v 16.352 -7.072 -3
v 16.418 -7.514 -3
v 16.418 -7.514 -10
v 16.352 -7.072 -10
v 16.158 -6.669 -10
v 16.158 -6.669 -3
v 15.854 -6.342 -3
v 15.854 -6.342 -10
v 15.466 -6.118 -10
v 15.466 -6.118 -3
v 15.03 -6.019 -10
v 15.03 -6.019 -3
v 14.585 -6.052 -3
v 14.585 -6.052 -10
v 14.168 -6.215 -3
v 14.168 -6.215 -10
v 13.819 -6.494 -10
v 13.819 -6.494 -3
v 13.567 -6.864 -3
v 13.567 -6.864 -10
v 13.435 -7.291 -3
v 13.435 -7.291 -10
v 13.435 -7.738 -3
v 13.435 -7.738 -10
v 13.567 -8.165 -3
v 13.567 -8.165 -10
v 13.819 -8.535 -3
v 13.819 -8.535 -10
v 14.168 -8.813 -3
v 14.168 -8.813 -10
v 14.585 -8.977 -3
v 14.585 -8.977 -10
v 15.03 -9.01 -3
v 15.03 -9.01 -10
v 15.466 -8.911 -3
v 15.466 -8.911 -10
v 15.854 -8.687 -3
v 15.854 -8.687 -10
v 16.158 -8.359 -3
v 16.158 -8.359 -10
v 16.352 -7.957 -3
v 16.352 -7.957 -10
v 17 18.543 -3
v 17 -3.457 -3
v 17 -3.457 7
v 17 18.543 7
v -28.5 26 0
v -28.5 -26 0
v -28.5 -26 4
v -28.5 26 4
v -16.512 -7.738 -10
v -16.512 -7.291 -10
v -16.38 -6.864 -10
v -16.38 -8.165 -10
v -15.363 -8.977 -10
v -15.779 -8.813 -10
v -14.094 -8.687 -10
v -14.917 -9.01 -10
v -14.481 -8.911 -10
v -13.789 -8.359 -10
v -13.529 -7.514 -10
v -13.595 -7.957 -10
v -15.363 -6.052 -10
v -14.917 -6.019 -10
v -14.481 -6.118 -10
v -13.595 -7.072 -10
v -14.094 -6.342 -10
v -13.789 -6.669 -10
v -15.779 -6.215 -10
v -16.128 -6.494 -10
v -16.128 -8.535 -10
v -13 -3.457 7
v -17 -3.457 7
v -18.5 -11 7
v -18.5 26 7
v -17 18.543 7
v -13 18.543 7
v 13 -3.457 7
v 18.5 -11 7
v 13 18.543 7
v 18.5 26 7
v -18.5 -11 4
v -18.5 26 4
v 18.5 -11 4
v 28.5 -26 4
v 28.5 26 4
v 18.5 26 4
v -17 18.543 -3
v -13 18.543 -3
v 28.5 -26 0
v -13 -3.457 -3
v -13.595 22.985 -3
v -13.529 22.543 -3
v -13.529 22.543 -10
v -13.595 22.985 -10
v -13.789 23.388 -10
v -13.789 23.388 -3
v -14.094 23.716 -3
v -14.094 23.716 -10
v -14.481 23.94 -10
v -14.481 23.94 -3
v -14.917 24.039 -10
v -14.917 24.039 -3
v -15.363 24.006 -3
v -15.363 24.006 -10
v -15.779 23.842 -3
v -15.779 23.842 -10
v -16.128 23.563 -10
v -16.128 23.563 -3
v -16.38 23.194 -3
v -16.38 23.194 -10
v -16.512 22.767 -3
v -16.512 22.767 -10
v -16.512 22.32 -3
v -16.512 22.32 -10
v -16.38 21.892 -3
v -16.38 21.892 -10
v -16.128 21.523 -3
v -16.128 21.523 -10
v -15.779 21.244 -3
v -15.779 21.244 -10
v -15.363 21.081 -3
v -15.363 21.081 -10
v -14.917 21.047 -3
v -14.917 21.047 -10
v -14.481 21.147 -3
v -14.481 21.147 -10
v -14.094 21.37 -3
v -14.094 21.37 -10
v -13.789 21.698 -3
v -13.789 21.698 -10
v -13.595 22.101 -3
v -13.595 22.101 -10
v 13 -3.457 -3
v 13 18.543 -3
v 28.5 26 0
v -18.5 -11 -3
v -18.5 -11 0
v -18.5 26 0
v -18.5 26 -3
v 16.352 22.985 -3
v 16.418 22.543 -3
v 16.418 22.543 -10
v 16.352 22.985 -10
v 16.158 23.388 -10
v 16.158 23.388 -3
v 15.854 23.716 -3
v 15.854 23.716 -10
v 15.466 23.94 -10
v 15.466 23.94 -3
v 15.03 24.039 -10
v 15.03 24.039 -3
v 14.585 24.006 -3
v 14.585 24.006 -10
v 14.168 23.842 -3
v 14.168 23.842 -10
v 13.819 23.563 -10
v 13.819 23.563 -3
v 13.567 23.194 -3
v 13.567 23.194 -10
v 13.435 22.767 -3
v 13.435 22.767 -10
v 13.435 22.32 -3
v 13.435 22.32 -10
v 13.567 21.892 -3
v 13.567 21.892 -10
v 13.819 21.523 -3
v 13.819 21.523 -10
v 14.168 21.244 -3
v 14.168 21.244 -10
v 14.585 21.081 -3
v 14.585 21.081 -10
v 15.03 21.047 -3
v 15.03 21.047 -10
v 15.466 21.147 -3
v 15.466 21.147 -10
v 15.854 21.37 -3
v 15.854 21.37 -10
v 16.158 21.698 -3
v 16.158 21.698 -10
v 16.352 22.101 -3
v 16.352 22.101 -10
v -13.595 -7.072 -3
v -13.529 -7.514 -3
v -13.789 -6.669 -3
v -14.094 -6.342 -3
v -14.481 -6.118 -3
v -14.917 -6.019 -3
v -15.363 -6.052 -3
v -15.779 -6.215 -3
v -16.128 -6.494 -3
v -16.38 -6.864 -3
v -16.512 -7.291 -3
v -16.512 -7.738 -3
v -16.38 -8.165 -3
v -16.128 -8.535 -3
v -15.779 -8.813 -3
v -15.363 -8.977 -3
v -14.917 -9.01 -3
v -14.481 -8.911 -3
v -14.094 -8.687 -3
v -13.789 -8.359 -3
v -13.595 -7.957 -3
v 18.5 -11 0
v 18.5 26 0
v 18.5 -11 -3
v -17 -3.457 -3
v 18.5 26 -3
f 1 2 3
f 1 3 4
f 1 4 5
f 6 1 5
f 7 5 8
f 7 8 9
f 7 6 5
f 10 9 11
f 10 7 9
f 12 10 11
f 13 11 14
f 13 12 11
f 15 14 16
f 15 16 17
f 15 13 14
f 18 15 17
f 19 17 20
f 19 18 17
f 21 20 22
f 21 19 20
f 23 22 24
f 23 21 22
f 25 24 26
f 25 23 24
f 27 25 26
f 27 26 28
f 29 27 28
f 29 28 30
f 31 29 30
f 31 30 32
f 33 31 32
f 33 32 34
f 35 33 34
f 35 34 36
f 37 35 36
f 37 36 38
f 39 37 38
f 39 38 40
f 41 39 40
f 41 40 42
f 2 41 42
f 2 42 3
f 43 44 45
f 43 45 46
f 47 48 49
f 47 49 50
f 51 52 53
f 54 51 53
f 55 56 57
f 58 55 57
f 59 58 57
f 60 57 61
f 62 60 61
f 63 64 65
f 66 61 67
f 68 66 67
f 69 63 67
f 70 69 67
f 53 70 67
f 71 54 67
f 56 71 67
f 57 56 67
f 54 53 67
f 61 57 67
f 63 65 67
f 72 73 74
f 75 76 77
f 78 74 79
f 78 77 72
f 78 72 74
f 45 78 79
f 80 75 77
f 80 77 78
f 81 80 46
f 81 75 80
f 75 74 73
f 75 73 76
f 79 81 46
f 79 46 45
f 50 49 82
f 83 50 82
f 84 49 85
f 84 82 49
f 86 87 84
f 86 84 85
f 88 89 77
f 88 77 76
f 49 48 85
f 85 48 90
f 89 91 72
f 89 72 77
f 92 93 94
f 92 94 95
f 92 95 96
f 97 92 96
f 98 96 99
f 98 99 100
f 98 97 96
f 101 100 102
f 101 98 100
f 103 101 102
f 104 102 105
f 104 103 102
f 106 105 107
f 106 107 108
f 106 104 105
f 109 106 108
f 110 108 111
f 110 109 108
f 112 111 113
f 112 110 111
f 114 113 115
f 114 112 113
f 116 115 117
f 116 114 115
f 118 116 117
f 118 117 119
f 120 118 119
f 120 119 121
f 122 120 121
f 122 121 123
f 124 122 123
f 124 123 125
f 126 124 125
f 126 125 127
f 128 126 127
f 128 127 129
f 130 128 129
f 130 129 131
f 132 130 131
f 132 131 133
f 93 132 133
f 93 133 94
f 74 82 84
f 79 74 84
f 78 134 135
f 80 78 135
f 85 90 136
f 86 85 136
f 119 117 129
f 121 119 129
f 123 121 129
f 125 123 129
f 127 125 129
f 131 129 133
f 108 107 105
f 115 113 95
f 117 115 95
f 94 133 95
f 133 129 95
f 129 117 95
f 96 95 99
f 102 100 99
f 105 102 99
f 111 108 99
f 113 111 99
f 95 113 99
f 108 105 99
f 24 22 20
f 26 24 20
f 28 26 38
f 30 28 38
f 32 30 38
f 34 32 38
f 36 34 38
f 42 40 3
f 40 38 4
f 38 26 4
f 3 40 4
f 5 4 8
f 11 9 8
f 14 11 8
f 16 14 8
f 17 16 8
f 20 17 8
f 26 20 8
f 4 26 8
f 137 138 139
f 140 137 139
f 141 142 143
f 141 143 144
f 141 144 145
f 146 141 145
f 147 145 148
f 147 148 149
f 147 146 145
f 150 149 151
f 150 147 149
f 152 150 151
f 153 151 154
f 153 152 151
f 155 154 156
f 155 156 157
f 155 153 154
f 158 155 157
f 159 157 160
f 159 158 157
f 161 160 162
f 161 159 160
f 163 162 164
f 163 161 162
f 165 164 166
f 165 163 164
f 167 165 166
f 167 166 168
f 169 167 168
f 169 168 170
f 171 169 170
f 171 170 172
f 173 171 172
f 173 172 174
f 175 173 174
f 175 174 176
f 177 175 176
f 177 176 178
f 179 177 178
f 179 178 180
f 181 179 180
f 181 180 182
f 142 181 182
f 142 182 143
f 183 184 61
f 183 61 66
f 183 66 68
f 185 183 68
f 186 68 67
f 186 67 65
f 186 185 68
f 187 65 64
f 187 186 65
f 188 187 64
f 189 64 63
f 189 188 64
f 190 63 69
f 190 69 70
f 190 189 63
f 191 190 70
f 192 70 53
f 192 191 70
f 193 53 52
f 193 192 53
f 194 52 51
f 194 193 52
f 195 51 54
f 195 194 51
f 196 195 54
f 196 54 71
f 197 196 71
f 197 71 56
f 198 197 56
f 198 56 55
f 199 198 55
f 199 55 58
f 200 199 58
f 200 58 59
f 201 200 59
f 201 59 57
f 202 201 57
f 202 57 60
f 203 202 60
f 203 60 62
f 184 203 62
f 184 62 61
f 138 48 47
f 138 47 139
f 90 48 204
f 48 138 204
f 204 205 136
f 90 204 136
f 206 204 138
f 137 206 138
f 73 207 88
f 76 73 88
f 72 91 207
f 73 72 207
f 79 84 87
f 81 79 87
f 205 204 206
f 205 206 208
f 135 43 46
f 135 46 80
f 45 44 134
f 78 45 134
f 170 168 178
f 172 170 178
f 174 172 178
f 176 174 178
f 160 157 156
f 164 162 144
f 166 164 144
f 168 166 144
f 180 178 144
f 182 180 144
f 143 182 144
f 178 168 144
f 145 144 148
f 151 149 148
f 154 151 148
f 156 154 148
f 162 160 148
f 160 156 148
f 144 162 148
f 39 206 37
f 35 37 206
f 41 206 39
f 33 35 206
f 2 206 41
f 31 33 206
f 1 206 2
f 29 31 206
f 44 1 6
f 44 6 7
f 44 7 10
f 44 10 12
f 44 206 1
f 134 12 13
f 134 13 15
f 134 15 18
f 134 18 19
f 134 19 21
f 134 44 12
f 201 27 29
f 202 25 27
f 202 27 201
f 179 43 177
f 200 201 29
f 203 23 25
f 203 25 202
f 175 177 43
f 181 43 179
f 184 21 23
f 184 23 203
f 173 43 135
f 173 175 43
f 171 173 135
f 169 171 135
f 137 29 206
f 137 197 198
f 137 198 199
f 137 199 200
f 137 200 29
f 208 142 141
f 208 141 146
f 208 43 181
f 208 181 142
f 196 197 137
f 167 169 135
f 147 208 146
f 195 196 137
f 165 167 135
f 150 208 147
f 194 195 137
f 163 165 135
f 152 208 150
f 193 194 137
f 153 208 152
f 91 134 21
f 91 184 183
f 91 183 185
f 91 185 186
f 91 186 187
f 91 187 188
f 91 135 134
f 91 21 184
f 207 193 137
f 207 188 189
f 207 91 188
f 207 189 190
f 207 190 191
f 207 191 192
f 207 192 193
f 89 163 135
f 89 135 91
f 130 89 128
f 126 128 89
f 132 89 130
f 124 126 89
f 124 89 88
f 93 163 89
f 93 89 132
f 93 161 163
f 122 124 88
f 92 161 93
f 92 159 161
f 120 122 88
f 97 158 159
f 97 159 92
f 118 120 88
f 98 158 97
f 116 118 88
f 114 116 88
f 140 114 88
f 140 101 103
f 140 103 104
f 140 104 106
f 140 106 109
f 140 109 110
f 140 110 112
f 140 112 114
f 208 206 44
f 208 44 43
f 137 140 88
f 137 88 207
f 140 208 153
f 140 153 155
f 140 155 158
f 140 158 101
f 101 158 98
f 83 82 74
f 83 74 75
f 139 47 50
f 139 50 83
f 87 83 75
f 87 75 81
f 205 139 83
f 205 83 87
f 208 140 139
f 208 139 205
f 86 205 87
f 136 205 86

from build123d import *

# Parameters (mm, degrees)
SKETCH1_W           = 57
SKETCH1_H           = 52
BOSS_EXTRUDE1_DEPTH = 4
SKETCH3_W           = 37
SKETCH3_H           = 37
BOSS_EXTRUDE2_DEPTH = 3
SKETCH4_W           = 37
SKETCH4_H           = 37
BOSS_EXTRUDE3_DEPTH = 3
SKETCH6_R           = 1.5
BOSS_EXTRUDE4_DEPTH = 10
SKETCH6_6_R         = 1.5
BOSS_EXTRUDE6_DEPTH = 10
SKETCH8_W           = 4
SKETCH8_H           = 22
CUT_EXTRUDE1_DEPTH  = 11


with BuildPart() as part:
    # Sketch1 → Boss-Extrude1 (new body)
    with BuildSketch(Plane.XY):
        Rectangle(SKETCH1_W, SKETCH1_H)
    extrude(amount=BOSS_EXTRUDE1_DEPTH)

    # Sketch3 → Boss-Extrude2 (add)
    with BuildSketch(Plane.XY.offset(4)):
        with Locations((0, 7.5)):
            Rectangle(SKETCH3_W, SKETCH3_H)
    extrude(amount=BOSS_EXTRUDE2_DEPTH)

    # Sketch4 → Boss-Extrude3 (add)
    with BuildSketch(Plane(origin=(0, 0, 0), x_dir=(-1, 0, 0), z_dir=(0, 0, -1))):
        with Locations((0, 7.5)):
            Rectangle(SKETCH4_W, SKETCH4_H)
    extrude(amount=BOSS_EXTRUDE3_DEPTH)

    # Sketch6 → Boss-Extrude4 (add)
    with BuildSketch(Plane.XY):
        with Locations((14.91830134, 22.543210914)):
            Circle(SKETCH6_R)
        with Locations((14.91830134, -7.514403638)):
            Circle(SKETCH6_R)
    extrude(amount=-BOSS_EXTRUDE4_DEPTH)

    # Sketch6<6> → Boss-Extrude6 (add)
    with BuildSketch(Plane.XY):
        with Locations((-15.028807276, 22.543210914)):
            Circle(SKETCH6_6_R)
        with Locations((14.91830134, 22.543210914)):
            Circle(SKETCH6_6_R)
        with Locations((-15.028807276, -7.514403638)):
            Circle(SKETCH6_6_R)
        with Locations((14.91830134, -7.514403638)):
            Circle(SKETCH6_6_R)
    extrude(amount=-BOSS_EXTRUDE6_DEPTH)

    # Sketch8 → Cut-Extrude1 (cut, through all)
    with BuildSketch(Plane(origin=(0, 0, -3), x_dir=(-1, 0, 0), z_dir=(0, 0, -1))):
        with Locations((-15, 7.543210914)):
            Rectangle(SKETCH8_W, SKETCH8_H)
        with Locations((15, 7.543210914)):
            Rectangle(SKETCH8_W, SKETCH8_H)
    extrude(amount=-CUT_EXTRUDE1_DEPTH, mode=Mode.SUBTRACT)


solid = part.part
